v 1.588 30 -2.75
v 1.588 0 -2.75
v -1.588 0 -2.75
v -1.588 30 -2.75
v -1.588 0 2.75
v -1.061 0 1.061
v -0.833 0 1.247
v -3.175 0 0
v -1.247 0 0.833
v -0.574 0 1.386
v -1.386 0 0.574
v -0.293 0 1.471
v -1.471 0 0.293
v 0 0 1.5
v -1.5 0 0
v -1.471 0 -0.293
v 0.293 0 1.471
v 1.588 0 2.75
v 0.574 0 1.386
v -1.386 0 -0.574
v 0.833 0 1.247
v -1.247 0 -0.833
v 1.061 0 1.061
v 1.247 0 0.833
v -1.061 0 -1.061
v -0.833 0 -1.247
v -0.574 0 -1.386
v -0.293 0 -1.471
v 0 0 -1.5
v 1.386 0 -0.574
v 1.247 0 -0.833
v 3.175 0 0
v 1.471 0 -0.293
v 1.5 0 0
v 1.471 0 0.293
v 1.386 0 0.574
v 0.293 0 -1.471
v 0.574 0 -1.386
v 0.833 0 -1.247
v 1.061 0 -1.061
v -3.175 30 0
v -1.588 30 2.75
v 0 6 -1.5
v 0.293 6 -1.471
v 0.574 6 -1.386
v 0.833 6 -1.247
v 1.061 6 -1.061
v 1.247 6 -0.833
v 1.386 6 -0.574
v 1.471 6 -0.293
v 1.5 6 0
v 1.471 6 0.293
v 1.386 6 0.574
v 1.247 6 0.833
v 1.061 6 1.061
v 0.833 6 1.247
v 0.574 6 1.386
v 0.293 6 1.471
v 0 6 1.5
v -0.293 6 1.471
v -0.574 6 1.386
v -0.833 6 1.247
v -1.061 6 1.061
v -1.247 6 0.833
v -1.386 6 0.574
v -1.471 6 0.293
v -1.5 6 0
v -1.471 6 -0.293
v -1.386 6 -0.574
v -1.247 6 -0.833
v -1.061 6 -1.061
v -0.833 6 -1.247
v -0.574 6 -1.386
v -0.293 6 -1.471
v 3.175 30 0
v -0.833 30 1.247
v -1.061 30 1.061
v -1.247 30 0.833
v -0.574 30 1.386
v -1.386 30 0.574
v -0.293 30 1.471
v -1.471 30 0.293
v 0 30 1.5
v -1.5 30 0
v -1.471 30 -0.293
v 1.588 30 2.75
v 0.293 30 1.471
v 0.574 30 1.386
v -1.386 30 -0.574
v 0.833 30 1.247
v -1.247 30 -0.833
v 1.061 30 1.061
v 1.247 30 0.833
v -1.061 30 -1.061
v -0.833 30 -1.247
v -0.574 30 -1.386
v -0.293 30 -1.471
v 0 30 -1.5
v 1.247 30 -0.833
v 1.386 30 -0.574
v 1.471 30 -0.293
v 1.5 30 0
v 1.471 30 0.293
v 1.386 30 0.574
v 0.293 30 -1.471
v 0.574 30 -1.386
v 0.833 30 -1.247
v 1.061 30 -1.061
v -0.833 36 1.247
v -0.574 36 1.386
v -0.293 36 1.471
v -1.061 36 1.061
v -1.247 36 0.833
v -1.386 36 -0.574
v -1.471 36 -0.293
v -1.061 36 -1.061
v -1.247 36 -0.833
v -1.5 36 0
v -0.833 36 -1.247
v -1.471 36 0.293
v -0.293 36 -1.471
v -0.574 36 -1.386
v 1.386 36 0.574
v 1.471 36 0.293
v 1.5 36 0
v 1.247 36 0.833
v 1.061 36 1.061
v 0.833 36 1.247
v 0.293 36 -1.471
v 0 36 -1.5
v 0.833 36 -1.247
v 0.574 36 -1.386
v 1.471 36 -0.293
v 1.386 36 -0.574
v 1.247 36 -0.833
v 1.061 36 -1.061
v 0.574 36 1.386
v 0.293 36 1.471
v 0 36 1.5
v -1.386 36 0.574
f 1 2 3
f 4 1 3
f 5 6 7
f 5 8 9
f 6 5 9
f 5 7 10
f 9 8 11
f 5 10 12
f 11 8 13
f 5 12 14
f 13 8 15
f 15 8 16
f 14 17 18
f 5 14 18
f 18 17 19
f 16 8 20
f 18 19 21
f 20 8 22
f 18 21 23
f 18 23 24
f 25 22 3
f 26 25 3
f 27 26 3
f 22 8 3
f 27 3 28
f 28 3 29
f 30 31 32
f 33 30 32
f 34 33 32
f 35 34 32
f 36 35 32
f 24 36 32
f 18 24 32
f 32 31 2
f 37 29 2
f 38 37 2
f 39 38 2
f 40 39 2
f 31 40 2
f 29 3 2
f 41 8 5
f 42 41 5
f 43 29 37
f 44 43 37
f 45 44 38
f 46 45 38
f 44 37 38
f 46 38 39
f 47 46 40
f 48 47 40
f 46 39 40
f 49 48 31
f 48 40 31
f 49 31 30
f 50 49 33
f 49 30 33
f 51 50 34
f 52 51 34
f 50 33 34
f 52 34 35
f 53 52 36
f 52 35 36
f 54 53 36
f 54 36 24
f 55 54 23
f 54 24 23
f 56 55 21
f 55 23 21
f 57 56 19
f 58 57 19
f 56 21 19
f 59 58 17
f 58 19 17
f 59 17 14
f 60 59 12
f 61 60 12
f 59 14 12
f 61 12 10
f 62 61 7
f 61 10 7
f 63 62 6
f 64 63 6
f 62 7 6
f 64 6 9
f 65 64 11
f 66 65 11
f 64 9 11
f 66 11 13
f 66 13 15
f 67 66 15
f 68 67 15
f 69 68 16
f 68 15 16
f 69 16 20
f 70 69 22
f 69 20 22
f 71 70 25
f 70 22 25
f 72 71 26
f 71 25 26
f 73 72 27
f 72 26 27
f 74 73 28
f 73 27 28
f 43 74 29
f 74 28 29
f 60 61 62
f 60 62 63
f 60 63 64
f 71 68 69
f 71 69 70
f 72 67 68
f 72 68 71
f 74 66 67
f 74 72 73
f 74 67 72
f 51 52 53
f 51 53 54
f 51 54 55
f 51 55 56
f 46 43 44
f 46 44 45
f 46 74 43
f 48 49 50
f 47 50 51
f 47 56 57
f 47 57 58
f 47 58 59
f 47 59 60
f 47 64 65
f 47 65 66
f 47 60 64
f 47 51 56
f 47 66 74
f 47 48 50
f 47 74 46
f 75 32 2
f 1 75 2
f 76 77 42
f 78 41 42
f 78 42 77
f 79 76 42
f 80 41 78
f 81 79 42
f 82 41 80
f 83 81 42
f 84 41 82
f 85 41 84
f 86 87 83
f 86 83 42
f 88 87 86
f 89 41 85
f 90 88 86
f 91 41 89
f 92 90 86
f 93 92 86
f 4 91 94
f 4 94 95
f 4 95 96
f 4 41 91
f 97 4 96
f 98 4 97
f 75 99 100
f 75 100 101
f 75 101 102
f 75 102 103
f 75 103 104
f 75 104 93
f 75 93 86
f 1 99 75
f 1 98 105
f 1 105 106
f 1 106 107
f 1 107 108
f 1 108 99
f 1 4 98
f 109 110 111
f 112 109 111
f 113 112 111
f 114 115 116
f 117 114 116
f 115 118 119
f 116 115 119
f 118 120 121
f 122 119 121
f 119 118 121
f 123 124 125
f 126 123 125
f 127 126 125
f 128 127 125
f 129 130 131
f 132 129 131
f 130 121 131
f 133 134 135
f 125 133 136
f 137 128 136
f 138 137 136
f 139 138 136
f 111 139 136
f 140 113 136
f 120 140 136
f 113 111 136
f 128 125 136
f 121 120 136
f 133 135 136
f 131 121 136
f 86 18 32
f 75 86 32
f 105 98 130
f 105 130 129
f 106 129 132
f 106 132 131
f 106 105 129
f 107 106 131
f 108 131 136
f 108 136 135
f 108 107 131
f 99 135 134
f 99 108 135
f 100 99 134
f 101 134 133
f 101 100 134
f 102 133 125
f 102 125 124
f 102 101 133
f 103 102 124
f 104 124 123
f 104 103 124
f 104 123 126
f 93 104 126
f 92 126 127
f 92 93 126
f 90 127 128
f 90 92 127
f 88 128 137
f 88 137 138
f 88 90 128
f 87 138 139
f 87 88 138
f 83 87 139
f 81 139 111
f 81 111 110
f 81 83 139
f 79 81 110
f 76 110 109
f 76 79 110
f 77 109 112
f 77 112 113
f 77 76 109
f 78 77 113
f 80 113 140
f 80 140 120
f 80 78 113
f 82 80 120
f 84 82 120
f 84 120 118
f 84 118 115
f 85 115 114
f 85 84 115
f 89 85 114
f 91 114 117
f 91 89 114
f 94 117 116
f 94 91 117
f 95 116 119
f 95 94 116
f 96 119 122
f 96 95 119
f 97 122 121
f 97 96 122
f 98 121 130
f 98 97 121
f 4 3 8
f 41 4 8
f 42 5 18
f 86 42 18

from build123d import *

# Parameters (mm, degrees)
BOSS_EXTRUDE1_DEPTH = 30
SKETCH2_R           = 1.5
CUT_EXTRUDE1_DEPTH  = 6
BOSS_EXTRUDE2_START = -30
SKETCH2_2_R         = 1.5
BOSS_EXTRUDE2_DEPTH = 6


with BuildPart() as part:
    # Sketch1 → Boss-Extrude1 (new body)
    with BuildSketch(Plane(origin=(0, 0, 0), x_dir=(1, 0, 0), z_dir=(0, 1, 0))):
        Polygon((1.58771324, -2.75), (3.175426481, 0), (1.58771324, 2.75), (-1.58771324, 2.75), (-3.175426481, 0), (-1.58771324, -2.75), align=None)
    extrude(amount=BOSS_EXTRUDE1_DEPTH)

    # Sketch2 → Cut-Extrude1 (cut)
    with BuildSketch(Plane.XZ):
        with Locations(Location((0, 0, 0), (0, 0, 270))):
            Circle(SKETCH2_R)
    extrude(amount=-CUT_EXTRUDE1_DEPTH, mode=Mode.SUBTRACT)

    # Sketch2<2> → Boss-Extrude2 (add)
    with BuildSketch(Plane.XZ.offset(BOSS_EXTRUDE2_START)):
        with Locations(Location((0, 0, 0), (0, 0, 270))):
            Circle(SKETCH2_2_R)
    extrude(amount=-BOSS_EXTRUDE2_DEPTH)


solid = part.part
